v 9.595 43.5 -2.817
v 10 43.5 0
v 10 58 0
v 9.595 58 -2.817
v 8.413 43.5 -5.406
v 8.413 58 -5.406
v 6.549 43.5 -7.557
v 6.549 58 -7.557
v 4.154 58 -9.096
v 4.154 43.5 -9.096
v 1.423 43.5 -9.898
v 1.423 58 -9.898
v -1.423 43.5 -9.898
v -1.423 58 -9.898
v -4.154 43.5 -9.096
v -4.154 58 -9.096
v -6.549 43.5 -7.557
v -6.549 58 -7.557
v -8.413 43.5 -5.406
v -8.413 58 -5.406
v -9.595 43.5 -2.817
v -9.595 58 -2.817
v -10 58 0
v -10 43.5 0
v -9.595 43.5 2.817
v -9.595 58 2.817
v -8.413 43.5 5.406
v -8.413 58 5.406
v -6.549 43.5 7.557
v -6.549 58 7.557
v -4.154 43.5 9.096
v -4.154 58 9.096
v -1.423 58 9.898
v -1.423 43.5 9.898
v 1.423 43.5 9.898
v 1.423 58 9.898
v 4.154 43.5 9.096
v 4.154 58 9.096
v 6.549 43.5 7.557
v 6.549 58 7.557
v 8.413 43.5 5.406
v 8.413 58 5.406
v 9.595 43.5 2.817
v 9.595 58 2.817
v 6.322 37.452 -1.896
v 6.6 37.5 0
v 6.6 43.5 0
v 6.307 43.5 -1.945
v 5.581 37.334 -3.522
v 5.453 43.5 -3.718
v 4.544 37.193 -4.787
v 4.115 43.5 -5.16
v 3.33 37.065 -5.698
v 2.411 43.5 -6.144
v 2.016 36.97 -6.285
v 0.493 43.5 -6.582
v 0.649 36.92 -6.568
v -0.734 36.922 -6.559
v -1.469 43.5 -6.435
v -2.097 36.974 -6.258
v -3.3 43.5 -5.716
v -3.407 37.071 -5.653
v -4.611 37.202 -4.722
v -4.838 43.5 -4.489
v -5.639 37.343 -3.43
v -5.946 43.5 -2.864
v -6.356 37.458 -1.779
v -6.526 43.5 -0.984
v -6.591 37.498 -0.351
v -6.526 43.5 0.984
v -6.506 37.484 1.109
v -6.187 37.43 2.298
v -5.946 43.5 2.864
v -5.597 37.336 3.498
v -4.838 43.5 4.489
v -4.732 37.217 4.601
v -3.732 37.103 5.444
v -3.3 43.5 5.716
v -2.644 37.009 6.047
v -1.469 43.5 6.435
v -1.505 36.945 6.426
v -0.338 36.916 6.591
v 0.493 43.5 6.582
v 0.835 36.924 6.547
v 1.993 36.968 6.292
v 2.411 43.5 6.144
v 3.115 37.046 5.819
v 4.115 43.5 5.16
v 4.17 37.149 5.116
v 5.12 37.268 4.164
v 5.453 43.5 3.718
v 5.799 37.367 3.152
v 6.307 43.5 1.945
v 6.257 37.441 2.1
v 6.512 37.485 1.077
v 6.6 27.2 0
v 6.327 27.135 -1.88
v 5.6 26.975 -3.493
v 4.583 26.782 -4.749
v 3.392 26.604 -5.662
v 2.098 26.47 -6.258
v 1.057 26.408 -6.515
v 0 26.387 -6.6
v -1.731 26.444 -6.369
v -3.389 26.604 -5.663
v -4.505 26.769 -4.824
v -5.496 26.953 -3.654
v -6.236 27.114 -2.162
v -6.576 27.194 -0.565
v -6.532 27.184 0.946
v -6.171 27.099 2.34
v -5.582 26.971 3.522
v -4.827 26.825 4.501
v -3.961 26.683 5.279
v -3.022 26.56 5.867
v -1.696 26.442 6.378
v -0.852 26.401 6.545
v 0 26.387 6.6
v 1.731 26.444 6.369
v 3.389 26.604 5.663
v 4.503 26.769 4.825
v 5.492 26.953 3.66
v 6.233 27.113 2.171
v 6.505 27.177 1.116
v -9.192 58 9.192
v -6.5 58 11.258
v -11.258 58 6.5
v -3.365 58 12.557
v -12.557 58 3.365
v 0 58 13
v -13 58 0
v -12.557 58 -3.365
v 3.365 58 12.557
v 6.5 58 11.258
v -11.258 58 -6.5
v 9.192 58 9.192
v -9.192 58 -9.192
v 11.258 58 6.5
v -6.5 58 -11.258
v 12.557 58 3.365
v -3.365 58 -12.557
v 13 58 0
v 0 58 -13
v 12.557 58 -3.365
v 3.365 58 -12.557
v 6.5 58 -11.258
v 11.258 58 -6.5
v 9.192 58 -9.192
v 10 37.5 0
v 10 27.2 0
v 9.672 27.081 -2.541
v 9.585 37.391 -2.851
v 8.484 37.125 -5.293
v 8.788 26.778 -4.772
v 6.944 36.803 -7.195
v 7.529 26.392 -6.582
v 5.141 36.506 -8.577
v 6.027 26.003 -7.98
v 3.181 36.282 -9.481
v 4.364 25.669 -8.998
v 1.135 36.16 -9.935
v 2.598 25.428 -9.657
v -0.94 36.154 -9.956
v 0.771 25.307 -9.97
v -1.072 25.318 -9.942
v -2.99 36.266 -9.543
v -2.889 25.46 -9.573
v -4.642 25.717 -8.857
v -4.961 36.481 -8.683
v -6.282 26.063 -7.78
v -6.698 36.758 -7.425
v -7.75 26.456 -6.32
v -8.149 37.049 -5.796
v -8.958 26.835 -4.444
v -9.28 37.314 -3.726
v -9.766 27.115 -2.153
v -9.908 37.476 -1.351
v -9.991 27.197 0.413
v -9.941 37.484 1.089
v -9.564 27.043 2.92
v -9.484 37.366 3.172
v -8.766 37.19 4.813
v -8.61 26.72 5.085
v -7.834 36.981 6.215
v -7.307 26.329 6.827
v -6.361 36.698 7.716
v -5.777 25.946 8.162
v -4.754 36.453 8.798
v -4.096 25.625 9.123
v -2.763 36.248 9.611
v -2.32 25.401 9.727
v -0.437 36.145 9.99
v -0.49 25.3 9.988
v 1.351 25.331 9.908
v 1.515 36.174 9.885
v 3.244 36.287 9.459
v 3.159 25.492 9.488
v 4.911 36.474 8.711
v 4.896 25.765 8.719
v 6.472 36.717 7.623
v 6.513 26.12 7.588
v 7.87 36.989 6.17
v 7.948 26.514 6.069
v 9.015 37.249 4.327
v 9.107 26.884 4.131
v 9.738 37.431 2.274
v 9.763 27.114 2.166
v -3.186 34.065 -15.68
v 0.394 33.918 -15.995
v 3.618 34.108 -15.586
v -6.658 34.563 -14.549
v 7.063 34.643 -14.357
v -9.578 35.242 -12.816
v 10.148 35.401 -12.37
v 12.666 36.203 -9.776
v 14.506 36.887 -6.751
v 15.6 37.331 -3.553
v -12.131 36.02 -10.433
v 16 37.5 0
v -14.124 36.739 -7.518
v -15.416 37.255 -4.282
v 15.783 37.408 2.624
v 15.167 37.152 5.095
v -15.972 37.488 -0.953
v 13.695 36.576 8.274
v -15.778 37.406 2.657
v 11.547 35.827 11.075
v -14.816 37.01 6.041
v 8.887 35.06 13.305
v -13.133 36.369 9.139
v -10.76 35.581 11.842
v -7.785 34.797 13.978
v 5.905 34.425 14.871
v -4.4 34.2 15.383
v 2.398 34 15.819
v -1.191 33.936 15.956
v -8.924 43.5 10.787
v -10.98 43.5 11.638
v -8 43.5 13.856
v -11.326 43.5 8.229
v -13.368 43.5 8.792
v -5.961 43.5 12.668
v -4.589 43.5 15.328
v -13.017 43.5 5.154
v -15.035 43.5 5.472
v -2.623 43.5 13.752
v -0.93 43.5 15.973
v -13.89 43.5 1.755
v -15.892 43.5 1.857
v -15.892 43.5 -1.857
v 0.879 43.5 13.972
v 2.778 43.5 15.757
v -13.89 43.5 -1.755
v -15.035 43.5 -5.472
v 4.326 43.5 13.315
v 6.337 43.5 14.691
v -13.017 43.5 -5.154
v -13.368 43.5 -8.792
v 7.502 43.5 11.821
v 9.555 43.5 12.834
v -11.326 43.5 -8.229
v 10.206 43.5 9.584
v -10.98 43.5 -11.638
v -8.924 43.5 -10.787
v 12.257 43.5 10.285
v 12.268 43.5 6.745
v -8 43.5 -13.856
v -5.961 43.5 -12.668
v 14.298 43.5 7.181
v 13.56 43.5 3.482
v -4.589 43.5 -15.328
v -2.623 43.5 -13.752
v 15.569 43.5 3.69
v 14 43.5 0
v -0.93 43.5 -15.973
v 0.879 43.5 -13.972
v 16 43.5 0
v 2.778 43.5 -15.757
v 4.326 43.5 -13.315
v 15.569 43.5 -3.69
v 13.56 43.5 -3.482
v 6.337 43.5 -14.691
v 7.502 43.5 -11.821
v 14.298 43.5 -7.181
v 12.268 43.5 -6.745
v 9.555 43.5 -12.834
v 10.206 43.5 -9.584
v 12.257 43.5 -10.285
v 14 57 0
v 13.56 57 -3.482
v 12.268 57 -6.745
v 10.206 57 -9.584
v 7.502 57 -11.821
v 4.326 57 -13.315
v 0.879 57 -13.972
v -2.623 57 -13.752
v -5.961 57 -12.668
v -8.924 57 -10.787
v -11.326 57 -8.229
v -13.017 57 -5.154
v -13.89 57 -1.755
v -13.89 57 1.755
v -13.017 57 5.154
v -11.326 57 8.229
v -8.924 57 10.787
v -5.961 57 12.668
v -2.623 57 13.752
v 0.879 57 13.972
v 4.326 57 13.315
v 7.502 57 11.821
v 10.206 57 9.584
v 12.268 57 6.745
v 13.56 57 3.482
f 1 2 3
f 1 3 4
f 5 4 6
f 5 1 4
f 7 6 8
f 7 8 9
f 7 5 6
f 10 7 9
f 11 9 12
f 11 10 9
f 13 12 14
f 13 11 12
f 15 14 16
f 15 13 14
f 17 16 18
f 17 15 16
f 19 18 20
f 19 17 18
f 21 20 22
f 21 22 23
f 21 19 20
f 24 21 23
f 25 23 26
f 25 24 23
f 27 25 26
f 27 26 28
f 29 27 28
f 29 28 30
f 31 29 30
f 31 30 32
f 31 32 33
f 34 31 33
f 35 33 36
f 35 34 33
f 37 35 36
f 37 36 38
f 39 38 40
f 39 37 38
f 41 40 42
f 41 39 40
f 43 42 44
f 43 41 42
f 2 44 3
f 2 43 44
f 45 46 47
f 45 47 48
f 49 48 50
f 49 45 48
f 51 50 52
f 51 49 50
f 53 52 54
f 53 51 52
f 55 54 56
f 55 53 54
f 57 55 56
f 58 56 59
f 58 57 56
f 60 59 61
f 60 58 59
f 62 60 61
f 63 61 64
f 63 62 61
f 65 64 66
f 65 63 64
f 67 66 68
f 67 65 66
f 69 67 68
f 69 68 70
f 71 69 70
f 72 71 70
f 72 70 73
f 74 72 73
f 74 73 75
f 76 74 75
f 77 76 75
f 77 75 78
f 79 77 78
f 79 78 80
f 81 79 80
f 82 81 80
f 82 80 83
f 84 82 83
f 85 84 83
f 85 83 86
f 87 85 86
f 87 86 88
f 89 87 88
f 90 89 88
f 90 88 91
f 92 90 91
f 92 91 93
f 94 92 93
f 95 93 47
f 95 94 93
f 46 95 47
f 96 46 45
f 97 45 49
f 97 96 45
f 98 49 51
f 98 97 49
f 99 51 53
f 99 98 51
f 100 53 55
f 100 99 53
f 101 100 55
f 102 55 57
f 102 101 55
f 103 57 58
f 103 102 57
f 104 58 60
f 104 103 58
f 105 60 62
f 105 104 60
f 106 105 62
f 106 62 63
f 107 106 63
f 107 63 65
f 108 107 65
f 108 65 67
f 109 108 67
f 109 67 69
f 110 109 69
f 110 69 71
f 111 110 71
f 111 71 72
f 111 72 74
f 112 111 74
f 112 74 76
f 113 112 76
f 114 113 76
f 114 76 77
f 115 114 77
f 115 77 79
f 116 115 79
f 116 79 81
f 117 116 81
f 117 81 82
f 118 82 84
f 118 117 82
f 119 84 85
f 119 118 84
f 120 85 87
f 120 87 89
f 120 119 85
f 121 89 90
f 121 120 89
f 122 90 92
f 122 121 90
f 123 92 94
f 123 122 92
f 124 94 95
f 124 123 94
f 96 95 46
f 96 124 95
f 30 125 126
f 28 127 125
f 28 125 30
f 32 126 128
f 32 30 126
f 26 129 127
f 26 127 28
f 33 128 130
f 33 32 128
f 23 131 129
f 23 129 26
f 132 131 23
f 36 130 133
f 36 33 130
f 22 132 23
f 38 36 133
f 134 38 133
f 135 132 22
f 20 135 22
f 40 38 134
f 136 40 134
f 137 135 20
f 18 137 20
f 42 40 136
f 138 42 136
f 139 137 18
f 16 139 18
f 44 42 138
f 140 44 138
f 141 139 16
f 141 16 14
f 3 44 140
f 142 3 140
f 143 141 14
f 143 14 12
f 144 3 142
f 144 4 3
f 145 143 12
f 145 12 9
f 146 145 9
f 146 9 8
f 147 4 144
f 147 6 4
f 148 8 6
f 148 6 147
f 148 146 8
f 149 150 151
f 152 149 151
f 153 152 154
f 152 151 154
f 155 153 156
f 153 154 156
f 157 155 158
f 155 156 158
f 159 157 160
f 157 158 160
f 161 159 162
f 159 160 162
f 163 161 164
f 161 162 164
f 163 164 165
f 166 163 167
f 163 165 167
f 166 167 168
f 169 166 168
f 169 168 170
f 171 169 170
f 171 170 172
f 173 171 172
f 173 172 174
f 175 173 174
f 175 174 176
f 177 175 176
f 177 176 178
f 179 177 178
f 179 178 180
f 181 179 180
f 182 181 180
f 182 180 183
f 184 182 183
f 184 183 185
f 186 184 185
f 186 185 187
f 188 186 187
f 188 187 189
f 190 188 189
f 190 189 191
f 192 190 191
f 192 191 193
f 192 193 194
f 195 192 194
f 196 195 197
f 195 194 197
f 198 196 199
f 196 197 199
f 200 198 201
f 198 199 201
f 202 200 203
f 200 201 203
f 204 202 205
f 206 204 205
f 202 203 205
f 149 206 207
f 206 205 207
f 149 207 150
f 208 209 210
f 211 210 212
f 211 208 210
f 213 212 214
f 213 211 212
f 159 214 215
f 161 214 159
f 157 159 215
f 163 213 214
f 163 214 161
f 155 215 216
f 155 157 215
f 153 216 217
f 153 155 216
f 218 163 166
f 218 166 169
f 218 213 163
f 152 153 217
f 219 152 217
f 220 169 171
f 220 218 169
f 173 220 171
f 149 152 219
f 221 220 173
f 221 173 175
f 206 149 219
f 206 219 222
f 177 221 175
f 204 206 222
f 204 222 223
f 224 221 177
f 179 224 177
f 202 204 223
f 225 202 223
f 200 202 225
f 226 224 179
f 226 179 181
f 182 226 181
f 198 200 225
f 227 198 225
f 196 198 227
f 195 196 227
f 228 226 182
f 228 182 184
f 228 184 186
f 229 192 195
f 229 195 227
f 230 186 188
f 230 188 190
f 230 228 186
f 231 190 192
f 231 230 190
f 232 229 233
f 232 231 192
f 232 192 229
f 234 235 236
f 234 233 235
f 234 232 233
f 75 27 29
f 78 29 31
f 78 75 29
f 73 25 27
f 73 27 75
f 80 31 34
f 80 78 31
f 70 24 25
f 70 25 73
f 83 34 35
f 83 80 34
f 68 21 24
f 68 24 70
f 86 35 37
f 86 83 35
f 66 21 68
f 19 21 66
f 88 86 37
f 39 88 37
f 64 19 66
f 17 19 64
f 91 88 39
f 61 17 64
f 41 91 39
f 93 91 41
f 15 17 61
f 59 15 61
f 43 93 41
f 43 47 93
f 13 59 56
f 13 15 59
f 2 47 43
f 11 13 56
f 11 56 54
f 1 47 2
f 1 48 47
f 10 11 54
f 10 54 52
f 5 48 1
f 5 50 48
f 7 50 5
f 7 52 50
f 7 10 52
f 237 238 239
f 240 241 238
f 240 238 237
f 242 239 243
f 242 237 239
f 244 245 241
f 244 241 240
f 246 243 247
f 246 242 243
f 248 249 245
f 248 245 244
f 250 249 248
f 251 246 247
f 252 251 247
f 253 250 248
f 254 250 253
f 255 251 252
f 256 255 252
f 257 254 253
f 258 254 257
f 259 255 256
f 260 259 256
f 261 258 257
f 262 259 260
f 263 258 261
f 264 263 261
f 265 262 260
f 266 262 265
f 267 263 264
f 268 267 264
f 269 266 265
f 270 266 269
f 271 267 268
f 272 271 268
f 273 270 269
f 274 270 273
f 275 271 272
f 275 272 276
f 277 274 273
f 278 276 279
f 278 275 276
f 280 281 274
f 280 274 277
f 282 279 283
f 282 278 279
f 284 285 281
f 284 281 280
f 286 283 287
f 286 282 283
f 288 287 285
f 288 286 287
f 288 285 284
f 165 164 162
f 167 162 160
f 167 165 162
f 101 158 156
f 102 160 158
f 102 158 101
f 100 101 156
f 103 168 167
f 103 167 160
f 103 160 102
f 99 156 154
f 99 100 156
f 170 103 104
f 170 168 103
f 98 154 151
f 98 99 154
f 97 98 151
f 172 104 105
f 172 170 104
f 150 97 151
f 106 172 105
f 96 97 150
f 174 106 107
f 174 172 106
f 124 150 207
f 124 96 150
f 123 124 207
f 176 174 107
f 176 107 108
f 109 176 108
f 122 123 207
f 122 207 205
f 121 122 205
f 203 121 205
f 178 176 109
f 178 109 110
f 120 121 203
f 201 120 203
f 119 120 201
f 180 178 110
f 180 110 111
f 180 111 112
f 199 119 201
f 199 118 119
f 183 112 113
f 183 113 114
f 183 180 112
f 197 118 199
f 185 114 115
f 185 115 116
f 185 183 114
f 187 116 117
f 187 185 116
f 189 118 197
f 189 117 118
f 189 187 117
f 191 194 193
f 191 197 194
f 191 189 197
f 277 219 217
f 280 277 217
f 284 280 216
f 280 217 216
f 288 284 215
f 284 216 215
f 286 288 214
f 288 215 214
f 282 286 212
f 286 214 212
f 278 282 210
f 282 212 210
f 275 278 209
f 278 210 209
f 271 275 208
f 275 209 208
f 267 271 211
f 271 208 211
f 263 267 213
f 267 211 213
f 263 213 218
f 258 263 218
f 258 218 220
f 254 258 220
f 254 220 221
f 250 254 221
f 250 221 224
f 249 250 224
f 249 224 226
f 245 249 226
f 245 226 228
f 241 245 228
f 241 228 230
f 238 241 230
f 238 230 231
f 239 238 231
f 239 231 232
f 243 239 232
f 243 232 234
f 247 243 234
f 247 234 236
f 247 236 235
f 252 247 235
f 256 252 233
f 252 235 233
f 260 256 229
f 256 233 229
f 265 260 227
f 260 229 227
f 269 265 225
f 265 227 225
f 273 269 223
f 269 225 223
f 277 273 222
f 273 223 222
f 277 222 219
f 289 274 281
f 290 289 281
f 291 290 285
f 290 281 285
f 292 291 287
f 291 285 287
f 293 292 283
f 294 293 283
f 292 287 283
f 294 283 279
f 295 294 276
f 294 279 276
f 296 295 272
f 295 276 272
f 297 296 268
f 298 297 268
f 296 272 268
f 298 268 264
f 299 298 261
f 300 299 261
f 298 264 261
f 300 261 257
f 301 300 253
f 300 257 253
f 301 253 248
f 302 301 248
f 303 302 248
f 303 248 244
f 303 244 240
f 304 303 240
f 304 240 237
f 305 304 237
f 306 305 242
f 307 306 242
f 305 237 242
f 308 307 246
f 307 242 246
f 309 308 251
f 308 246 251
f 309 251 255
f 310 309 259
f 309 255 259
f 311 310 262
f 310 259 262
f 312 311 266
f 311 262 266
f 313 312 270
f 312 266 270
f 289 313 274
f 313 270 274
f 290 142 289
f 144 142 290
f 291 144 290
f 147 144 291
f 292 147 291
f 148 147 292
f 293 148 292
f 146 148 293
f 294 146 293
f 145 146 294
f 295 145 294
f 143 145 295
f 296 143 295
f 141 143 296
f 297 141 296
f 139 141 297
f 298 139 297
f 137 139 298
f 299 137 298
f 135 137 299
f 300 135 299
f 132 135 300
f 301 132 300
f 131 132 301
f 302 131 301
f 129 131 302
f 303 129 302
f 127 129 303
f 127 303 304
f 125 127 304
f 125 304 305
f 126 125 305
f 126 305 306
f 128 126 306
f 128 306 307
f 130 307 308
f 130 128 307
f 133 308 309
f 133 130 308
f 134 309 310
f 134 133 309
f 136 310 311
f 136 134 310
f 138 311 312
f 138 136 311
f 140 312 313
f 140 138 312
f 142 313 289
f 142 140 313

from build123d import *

# Parameters (mm, degrees)
SKETCH1_R               = 16
SKETCH1_R_2             = 6.6
BOSS_EXTRUDE1_DEPTH     = 43.5
SKETCH2_R               = 14
SKETCH2_R_2             = 10
BOSS_EXTRUDE2_DEPTH     = 14.5
SKETCH3_R               = 37.5
CUT_EXTRUDE1_DEPTH      = 17
CUT_EXTRUDE1_DEPTH_BACK = 17
BOSS_EXTRUDE3_REACH     = 60
SKETCH4_R               = 10
SKETCH4_R_2             = 6.6
SKETCH5_R               = 27.2
CUT_EXTRUDE2_DEPTH      = 17.0000001
CUT_EXTRUDE2_DEPTH_BACK = 17.0000001
CHAMFER1_SIZE           = 1


with BuildPart() as part:
    # Sketch1 → Boss-Extrude1 (new body)
    with BuildSketch(Plane(origin=(0, 0, 0), x_dir=(1, 0, 0), z_dir=(0, 1, 0))):
        Circle(SKETCH1_R)
        Circle(SKETCH1_R_2, mode=Mode.SUBTRACT)
    extrude(amount=BOSS_EXTRUDE1_DEPTH)

    # Sketch2 → Boss-Extrude2 (add)
    with BuildSketch(Plane(origin=(0, 43.5, 0), x_dir=(1, 0, 0), z_dir=(0, 1, 0))):
        Circle(SKETCH2_R)
        Circle(SKETCH2_R_2, mode=Mode.SUBTRACT)
    extrude(amount=BOSS_EXTRUDE2_DEPTH)

    # Sketch3 → Cut-Extrude1 (cut, two sides)
    with BuildSketch(Plane(origin=(0, 0, 0), x_dir=(0, 0, -1), z_dir=(1, 0, 0))) as cut_extrude1_sk:
        Circle(SKETCH3_R)
    extrude(amount=CUT_EXTRUDE1_DEPTH, mode=Mode.SUBTRACT)
    extrude(cut_extrude1_sk.sketch, amount=-CUT_EXTRUDE1_DEPTH_BACK, mode=Mode.SUBTRACT)

    # Sketch4 → Boss-Extrude3 (add, up to next)
    with BuildSketch(Plane(origin=(0, 0, 0), x_dir=(1, 0, 0), z_dir=(0, 1, 0)), mode=Mode.PRIVATE) as boss_extrude3_sk1:
        Circle(SKETCH4_R)
        Circle(SKETCH4_R_2, mode=Mode.SUBTRACT)
    boss_extrude3_tool1 = extrude(boss_extrude3_sk1.sketch, amount=BOSS_EXTRUDE3_REACH, mode=Mode.PRIVATE) - part.part
    add(boss_extrude3_tool1.solids().sort_by_distance((-9.717157, 0, 0))[0])

    # Sketch5 → Cut-Extrude2 (cut, two sides)
    with BuildSketch(Plane(origin=(0, 0, 0), x_dir=(0, 0, -1), z_dir=(1, 0, 0))) as cut_extrude2_sk:
        Circle(SKETCH5_R)
    extrude(amount=CUT_EXTRUDE2_DEPTH, mode=Mode.SUBTRACT)
    extrude(cut_extrude2_sk.sketch, amount=-CUT_EXTRUDE2_DEPTH_BACK, mode=Mode.SUBTRACT)

    # Chamfer1
    chamfer1_edges = [part.edges().sort_by_distance(p)[0] for p in [
        (-14, 58, 0),
    ]]
    chamfer(chamfer1_edges, length=CHAMFER1_SIZE)


solid = part.part
